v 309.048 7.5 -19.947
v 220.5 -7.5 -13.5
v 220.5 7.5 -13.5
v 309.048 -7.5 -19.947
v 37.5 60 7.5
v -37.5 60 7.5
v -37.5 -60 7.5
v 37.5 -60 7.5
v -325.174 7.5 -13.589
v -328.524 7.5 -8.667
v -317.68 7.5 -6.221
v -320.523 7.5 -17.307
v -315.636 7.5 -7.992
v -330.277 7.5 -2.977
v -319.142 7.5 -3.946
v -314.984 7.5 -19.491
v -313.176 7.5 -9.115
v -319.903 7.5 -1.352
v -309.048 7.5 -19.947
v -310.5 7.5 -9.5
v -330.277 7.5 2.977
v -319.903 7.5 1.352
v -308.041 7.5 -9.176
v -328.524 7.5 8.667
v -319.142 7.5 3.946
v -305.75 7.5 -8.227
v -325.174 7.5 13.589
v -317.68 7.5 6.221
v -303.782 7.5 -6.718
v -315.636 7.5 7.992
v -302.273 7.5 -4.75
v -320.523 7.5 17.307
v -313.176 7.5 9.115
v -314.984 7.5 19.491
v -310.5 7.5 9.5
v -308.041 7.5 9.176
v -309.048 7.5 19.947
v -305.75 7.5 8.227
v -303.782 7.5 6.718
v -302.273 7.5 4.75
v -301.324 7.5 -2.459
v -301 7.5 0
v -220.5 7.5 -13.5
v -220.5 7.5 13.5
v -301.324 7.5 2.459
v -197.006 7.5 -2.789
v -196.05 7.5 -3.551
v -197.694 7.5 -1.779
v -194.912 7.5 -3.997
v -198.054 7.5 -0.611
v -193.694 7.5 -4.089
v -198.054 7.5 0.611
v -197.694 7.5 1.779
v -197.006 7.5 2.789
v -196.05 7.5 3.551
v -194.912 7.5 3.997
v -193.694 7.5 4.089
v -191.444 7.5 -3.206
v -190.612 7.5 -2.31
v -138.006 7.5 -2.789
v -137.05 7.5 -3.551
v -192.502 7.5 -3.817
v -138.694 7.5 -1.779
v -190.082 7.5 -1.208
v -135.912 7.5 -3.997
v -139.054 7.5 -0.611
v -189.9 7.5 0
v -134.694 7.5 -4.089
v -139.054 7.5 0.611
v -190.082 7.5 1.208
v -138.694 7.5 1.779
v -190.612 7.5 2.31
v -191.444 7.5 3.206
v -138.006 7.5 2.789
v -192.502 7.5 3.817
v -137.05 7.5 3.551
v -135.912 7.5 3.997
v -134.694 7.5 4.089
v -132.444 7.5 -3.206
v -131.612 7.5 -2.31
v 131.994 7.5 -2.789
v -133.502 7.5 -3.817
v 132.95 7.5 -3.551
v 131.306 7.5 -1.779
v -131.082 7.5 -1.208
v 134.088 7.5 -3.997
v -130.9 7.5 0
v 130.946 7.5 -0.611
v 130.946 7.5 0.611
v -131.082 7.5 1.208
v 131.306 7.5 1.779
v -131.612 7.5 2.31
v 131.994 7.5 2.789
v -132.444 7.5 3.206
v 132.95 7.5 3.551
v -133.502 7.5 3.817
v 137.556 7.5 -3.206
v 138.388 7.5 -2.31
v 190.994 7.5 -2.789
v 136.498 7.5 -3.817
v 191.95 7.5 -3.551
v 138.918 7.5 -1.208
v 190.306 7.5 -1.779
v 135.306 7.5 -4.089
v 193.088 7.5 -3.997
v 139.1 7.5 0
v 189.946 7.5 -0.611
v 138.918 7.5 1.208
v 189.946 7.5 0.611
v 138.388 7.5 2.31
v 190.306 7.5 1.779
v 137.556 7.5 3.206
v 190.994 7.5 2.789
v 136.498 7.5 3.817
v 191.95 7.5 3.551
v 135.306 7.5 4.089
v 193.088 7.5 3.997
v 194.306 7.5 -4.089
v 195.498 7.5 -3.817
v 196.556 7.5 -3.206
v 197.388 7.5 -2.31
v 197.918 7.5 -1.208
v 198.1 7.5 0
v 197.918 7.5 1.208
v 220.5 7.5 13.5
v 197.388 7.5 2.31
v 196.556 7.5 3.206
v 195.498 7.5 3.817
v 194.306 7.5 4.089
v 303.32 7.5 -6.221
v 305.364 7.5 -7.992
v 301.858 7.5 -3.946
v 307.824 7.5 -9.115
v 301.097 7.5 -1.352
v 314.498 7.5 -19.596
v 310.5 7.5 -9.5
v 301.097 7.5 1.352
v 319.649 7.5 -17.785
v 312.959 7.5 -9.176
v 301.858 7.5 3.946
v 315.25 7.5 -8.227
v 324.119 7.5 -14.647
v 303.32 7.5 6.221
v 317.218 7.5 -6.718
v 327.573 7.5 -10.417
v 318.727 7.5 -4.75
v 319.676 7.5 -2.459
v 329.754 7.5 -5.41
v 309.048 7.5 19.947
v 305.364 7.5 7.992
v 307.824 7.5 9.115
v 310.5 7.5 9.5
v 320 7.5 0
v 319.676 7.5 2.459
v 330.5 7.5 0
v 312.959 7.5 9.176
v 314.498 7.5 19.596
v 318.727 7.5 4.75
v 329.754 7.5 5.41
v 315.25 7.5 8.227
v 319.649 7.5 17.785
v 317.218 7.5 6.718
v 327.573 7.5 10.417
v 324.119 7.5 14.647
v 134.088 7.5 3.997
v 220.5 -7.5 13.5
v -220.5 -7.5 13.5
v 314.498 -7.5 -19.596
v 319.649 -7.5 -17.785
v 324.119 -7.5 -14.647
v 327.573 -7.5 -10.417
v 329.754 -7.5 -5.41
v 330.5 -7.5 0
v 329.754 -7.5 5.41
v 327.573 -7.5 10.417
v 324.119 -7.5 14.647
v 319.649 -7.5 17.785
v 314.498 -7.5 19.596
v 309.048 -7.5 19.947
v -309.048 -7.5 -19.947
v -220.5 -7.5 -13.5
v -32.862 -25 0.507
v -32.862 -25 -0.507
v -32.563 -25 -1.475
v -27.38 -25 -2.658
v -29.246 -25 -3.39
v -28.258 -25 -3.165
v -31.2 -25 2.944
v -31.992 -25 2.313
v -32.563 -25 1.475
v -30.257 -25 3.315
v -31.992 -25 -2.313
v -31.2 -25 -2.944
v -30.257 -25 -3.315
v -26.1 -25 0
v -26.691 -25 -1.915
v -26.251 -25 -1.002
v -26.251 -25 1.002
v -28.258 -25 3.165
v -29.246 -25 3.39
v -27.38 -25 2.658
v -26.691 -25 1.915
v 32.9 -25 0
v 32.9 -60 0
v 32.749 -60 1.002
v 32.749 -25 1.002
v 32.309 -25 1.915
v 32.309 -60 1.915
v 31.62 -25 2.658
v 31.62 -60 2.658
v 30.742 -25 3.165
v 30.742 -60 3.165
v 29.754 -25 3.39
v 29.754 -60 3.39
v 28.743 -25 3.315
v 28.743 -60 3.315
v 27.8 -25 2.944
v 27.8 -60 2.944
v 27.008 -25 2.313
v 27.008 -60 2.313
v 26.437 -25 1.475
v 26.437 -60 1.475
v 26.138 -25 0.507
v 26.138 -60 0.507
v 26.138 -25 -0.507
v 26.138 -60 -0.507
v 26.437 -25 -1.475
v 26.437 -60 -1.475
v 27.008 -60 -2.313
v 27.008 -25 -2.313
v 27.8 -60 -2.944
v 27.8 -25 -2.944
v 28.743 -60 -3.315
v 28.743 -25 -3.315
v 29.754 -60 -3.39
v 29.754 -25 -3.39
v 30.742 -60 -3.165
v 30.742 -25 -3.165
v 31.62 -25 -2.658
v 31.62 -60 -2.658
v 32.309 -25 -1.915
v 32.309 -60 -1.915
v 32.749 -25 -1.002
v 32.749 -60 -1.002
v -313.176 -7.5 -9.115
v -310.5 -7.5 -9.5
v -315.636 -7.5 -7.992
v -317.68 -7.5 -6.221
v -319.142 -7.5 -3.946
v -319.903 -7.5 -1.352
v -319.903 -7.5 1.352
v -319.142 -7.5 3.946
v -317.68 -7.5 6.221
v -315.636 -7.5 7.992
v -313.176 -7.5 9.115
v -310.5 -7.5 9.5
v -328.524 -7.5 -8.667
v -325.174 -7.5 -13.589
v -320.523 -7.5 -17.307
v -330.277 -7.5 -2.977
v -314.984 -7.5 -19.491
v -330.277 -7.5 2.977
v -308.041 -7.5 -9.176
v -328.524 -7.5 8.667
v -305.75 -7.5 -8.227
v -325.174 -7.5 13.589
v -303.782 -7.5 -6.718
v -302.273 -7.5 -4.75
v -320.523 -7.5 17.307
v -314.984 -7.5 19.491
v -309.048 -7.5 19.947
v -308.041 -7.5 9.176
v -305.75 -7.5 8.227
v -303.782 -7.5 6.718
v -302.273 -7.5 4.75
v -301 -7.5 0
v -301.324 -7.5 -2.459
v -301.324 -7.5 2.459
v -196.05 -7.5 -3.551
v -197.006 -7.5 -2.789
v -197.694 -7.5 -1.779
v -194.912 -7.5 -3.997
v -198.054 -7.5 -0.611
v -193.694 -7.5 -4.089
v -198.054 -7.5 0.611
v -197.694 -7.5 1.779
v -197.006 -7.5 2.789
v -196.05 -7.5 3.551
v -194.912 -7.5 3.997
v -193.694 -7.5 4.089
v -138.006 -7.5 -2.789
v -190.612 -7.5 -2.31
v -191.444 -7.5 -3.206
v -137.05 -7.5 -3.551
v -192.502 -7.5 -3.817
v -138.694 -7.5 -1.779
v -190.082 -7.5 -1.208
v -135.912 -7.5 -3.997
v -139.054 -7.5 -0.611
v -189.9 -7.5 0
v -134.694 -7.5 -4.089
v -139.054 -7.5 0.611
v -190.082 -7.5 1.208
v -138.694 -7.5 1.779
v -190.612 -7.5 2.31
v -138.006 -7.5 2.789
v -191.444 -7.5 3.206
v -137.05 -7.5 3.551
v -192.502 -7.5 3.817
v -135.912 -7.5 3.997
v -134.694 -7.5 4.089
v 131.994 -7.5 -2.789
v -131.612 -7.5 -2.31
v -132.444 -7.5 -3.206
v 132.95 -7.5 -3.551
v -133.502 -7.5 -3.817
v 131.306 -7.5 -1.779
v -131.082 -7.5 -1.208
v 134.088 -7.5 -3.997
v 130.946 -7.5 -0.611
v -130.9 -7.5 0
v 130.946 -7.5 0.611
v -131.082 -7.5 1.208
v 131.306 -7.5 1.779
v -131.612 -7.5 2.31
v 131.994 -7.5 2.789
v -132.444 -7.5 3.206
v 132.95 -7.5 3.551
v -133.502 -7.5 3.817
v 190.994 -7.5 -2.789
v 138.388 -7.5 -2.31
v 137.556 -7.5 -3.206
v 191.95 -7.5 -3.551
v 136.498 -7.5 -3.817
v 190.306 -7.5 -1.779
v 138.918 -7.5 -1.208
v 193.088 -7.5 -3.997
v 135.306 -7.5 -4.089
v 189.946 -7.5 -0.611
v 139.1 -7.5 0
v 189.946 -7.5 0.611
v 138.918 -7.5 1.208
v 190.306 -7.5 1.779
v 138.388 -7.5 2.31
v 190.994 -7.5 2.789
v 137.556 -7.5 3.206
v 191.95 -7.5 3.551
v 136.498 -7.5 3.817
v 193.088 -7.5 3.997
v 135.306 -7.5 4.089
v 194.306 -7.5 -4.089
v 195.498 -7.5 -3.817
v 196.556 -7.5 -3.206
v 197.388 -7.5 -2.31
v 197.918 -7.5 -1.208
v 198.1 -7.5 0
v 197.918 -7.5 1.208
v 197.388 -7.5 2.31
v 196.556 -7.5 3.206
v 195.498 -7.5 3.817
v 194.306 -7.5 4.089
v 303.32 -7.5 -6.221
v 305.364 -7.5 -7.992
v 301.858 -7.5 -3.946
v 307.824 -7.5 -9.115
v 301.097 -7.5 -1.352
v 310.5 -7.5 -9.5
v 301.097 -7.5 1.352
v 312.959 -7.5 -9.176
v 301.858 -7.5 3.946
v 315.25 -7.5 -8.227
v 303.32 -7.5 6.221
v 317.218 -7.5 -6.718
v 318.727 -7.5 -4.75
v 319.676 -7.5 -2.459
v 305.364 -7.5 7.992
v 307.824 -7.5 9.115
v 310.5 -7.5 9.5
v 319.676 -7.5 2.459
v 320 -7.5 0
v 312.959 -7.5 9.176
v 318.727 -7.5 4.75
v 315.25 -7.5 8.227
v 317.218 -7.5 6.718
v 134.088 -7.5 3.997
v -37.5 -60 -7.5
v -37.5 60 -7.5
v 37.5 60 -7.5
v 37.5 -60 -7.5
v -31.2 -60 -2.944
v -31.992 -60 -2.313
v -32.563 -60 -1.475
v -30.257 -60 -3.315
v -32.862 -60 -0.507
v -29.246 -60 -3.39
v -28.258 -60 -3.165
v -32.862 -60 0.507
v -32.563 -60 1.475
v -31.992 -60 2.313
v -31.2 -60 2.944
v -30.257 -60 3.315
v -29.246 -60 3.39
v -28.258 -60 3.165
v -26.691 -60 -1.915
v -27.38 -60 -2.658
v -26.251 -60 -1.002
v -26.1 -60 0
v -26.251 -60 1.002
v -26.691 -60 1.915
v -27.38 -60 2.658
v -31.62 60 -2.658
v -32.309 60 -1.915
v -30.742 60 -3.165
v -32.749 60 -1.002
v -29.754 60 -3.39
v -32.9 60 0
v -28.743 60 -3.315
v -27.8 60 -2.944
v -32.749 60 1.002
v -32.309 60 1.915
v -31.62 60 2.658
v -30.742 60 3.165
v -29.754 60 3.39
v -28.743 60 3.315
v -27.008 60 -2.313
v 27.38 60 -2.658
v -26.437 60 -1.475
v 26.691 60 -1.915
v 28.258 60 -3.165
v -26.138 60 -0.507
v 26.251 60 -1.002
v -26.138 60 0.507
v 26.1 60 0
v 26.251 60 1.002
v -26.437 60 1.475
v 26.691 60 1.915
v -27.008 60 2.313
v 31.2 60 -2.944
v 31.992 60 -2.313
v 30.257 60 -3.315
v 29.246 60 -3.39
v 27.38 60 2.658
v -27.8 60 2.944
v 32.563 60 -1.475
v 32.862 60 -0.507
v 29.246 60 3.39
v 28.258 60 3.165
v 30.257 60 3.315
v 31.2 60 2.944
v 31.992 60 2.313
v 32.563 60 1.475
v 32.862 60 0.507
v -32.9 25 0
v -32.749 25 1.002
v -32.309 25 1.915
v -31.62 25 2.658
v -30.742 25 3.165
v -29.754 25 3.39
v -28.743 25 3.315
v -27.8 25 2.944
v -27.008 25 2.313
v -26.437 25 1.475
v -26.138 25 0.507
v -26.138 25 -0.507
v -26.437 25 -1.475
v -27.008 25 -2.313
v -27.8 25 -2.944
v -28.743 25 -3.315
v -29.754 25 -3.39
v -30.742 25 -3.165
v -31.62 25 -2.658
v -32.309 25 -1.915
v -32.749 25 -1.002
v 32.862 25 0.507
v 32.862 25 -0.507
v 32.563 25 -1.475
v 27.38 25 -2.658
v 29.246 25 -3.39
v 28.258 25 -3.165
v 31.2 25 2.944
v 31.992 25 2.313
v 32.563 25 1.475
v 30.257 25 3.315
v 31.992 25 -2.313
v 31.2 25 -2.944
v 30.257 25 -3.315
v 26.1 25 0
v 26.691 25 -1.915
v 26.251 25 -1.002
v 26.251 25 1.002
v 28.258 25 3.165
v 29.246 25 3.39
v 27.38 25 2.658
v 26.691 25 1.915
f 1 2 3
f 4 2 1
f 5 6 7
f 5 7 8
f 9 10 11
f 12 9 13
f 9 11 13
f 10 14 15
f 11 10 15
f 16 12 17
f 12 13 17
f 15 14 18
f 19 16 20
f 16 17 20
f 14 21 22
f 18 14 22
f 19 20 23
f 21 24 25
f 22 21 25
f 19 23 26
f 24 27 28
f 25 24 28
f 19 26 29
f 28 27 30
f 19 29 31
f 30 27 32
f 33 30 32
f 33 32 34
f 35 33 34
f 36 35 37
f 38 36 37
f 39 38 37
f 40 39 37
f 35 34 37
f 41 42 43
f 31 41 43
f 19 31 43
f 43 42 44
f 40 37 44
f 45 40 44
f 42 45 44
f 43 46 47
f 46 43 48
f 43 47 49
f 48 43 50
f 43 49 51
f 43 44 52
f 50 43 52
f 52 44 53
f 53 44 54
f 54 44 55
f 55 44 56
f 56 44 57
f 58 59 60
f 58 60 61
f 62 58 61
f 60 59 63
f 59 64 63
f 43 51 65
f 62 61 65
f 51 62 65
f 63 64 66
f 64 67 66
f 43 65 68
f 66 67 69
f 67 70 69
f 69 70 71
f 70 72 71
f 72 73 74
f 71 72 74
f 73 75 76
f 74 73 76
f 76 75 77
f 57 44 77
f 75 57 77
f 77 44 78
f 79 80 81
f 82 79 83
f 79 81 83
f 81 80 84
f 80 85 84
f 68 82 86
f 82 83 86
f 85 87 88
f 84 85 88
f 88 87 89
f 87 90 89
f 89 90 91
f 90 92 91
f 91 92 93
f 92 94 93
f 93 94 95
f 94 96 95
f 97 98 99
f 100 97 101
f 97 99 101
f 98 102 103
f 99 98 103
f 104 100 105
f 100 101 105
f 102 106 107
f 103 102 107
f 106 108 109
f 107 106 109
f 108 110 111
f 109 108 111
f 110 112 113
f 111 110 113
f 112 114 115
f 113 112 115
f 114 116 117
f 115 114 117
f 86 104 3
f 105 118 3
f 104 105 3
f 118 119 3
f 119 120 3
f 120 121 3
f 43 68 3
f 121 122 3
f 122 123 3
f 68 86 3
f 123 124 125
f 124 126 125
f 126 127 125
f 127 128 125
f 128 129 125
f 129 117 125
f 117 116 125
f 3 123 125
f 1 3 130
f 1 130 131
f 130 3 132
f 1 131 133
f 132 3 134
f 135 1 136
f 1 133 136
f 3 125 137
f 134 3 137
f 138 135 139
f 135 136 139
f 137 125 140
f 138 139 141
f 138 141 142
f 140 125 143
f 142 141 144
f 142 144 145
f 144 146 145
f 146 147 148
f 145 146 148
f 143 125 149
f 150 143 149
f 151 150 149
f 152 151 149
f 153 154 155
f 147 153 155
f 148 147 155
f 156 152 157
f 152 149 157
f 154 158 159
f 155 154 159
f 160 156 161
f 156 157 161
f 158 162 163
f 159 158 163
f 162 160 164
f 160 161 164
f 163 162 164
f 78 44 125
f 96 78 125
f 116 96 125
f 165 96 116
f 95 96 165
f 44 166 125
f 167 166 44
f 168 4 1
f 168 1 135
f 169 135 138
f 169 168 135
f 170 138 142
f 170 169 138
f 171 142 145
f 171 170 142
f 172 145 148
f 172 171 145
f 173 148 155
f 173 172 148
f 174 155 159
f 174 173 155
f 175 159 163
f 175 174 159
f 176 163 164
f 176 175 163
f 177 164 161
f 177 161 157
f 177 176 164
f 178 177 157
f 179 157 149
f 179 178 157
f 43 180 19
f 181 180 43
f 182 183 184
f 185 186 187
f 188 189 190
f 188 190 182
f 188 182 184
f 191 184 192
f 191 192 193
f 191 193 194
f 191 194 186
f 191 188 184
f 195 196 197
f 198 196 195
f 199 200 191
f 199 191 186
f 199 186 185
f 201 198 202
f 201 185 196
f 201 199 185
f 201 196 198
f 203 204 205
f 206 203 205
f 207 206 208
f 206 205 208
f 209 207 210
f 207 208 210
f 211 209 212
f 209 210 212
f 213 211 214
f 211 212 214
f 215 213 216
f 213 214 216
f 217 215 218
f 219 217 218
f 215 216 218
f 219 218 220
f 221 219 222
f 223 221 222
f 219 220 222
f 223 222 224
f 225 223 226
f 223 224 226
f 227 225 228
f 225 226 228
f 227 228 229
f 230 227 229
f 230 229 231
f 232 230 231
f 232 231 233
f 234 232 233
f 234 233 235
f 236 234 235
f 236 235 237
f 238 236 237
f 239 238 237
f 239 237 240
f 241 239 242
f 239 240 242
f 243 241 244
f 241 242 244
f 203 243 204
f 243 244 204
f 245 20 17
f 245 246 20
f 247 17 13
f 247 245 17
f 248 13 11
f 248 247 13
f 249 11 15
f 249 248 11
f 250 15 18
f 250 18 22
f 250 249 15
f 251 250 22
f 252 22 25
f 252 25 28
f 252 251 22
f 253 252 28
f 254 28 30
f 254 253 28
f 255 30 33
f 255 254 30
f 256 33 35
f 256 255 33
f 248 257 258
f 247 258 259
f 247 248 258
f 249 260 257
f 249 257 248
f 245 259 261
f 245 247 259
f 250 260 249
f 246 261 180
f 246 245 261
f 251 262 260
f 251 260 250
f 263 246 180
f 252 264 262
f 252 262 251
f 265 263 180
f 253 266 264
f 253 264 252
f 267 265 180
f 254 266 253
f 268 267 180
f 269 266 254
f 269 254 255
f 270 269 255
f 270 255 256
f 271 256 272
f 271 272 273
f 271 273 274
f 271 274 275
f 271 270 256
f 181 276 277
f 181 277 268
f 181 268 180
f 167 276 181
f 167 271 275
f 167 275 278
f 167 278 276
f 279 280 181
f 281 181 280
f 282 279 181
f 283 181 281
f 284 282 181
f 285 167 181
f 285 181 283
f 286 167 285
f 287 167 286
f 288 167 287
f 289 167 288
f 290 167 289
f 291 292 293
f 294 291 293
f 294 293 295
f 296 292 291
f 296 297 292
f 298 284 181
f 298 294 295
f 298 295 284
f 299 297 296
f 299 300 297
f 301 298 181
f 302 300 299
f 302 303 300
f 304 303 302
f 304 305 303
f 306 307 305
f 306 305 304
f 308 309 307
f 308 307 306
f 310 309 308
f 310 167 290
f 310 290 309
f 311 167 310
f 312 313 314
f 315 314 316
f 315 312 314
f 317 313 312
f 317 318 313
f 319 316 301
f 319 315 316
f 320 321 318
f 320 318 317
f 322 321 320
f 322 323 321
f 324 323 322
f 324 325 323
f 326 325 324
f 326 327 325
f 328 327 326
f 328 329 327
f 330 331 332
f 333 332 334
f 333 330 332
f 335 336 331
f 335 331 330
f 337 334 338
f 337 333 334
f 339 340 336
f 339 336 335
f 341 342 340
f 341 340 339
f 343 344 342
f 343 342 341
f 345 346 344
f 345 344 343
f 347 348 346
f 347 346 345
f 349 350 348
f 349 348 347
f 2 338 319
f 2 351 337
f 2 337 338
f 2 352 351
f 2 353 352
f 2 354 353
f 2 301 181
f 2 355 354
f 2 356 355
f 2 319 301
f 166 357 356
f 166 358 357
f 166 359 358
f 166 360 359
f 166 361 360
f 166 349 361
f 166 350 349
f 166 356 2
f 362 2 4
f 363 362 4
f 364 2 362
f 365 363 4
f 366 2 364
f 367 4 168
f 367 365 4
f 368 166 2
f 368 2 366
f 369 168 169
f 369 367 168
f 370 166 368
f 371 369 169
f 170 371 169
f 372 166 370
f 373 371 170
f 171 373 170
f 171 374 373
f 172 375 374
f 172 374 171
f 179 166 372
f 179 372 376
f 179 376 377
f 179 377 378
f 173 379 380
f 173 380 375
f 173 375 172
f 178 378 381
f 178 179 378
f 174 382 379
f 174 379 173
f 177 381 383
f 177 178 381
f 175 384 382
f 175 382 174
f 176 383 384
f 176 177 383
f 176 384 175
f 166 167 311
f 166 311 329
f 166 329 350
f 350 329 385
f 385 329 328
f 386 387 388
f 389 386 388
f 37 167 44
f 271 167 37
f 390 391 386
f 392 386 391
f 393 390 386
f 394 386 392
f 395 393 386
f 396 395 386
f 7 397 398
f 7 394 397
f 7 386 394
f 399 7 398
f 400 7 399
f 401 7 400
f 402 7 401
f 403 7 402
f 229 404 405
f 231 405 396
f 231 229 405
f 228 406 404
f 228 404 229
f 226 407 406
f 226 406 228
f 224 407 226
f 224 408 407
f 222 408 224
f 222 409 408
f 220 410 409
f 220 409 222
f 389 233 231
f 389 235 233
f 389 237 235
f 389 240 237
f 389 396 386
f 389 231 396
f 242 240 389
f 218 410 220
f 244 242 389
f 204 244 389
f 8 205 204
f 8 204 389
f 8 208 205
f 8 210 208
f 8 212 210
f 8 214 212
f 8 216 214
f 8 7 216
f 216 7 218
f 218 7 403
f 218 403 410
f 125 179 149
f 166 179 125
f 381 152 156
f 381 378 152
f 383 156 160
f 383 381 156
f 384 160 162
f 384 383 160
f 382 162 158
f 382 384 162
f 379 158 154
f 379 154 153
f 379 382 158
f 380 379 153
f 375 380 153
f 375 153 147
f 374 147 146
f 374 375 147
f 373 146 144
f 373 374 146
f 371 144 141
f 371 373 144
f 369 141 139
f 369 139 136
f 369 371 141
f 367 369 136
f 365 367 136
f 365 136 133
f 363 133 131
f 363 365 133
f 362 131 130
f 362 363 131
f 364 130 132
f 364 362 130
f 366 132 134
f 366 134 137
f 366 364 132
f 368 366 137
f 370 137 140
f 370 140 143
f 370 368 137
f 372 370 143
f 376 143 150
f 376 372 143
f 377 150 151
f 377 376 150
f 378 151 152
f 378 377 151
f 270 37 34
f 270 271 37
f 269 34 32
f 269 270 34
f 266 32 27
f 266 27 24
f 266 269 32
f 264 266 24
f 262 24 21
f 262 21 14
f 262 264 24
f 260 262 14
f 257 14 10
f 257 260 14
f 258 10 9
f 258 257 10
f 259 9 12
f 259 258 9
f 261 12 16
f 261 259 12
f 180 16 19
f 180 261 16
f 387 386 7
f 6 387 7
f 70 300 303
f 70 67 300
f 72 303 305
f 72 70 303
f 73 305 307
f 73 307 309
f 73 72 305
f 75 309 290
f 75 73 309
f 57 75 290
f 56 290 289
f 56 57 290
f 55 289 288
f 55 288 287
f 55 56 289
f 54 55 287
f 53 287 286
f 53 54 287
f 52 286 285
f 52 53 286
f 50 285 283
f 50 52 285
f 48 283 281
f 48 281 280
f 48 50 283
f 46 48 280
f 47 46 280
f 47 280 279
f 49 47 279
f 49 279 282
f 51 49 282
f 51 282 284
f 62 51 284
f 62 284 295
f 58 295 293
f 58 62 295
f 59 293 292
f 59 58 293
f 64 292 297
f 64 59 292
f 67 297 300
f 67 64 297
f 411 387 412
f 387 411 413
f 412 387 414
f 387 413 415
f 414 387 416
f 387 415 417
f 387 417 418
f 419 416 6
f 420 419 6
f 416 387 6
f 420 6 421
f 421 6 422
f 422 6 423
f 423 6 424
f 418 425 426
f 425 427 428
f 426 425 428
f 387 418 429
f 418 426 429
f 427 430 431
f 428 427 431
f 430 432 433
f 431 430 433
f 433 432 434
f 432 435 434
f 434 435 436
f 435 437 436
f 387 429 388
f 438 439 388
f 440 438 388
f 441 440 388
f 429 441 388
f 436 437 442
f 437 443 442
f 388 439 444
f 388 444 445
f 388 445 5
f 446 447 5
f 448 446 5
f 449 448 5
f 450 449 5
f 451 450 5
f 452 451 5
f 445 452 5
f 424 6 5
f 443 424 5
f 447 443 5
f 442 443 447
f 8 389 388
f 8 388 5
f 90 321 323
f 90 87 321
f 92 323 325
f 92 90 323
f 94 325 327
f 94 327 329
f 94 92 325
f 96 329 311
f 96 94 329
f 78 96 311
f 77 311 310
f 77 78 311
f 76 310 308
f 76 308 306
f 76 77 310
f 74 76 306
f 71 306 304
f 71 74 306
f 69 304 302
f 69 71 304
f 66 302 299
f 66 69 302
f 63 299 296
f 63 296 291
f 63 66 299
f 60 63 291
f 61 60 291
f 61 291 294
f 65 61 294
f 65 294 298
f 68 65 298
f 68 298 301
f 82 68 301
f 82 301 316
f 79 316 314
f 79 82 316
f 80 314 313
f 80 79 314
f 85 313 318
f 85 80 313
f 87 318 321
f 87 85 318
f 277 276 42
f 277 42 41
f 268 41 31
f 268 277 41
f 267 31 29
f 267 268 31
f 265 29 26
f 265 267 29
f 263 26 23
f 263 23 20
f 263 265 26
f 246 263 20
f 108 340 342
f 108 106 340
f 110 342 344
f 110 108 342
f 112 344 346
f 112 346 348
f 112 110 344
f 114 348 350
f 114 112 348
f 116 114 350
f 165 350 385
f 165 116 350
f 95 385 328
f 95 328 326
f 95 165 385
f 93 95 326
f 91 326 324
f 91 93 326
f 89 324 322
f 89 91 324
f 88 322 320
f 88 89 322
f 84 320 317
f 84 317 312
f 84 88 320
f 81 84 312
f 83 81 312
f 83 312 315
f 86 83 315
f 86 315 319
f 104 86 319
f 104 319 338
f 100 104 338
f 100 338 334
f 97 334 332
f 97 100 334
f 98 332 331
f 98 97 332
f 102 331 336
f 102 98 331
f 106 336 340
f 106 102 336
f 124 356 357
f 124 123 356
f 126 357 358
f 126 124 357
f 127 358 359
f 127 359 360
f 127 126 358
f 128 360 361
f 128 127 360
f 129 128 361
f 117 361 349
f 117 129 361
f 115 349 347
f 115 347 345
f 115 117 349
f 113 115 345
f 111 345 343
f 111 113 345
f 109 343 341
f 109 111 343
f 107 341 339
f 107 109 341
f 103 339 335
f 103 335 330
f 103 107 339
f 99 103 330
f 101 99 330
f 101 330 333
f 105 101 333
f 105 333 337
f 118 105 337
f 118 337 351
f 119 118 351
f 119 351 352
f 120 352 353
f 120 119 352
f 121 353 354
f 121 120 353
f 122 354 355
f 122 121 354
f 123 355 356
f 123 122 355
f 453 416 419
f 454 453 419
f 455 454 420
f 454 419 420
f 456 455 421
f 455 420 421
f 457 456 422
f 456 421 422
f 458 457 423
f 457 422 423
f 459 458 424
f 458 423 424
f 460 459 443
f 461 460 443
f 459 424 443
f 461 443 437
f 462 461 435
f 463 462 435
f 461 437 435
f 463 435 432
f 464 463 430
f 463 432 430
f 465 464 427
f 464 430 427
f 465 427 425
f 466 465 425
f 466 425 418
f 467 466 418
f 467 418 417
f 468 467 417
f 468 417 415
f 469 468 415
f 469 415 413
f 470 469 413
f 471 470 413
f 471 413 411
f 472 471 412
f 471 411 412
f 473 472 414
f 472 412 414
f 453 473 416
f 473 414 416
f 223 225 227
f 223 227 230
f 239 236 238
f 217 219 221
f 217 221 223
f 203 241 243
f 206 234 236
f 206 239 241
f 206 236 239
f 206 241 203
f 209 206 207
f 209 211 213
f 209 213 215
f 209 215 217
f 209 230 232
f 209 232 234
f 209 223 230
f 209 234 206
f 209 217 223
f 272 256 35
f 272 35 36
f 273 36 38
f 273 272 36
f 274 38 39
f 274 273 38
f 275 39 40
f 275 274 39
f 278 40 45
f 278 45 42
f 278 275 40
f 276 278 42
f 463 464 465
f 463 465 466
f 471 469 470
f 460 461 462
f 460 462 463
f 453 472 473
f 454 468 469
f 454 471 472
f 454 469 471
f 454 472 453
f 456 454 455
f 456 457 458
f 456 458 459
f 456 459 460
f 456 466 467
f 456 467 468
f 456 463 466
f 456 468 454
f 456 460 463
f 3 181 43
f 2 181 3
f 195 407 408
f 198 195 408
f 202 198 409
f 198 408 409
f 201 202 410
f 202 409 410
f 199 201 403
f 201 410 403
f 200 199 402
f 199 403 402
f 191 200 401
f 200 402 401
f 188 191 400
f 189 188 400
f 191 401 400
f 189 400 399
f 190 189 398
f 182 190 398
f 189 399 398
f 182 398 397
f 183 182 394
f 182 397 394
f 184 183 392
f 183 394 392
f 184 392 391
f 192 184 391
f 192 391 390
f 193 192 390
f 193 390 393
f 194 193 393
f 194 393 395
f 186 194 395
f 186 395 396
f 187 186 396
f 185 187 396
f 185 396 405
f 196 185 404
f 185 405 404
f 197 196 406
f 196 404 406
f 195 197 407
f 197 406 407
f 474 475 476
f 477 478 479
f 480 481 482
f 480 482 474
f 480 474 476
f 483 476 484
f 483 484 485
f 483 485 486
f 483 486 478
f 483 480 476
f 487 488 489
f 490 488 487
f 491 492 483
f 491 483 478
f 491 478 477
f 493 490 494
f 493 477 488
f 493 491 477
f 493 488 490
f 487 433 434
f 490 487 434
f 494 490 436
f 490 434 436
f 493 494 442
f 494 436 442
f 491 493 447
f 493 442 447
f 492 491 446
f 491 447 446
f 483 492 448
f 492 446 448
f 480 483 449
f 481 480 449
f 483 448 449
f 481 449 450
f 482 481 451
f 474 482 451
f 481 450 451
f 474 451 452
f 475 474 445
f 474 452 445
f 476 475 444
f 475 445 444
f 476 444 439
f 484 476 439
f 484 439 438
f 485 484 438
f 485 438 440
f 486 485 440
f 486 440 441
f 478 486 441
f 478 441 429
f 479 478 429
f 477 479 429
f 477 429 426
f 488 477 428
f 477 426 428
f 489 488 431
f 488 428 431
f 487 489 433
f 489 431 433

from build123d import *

# Parameters (mm, degrees)
F0_R     = 4.1
F1_DEPTH = 7.5
F2_W     = 75
F2_H     = 15
F2_R     = 3.4
F3_DEPTH = 60
F4_R     = 3.4
F6_DEPTH = 35
F5_R     = 3.4
F7_DEPTH = 35


with BuildPart() as f1:
    # F0 (on Front) → F1 (new body, symmetric)
    with BuildSketch(Plane.XZ):
        with BuildLine():
            Line((-310.5, 13.5), (-295.743645, 13.5))
            ThreePointArc((-295.743645, 13.5), (-301.77806, 17.997993), (-309.047635, 19.947196))
            ThreePointArc((-309.047635, 19.947196), (-330.5, 0), (-309.047635, -19.947196))
            ThreePointArc((-309.047635, -19.947196), (-301.77806, -17.997993), (-295.743645, -13.5))
            Line((-295.743645, -13.5), (-310.5, -13.5))
            Line((-310.5, -13.5), (-310.5, -9.5))
            ThreePointArc((-310.5, -9.5), (-320, 0), (-310.5, 9.5))
            Line((-310.5, 9.5), (-310.5, 13.5))
        make_face()
        with BuildLine():
            ThreePointArc((-290.5, 0), (-291.856944, 7.241302), (-295.743645, 13.5))
            Line((-295.743645, 13.5), (-310.5, 13.5))
            Line((-310.5, 13.5), (-310.5, 9.5))
            ThreePointArc((-310.5, 9.5), (-303.782486, 6.717514), (-301, 0))
            ThreePointArc((-301, 0), (-303.782486, -6.717514), (-310.5, -9.5))
            Line((-310.5, -9.5), (-310.5, -13.5))
            Line((-310.5, -13.5), (-295.743645, -13.5))
            ThreePointArc((-295.743645, -13.5), (-291.856944, -7.241302), (-290.5, 0))
        make_face()
        with BuildLine():
            Line((-295.743645, 13.5), (-220.5, 13.5))
            Line((-220.5, 13.5), (-309.047635, 19.947196))
            ThreePointArc((-309.047635, 19.947196), (-301.77806, 17.997993), (-295.743645, 13.5))
        make_face()
        with BuildLine():
            ThreePointArc((-295.743645, -13.5), (-301.77806, -17.997993), (-309.047635, -19.947196))
            Line((-309.047635, -19.947196), (-220.5, -13.5))
            Line((-220.5, -13.5), (-295.743645, -13.5))
        make_face()
        with BuildLine():
            Line((295.743645, 13.5), (220.5, 13.5))
            Line((220.5, 13.5), (-220.5, 13.5))
            Line((-220.5, 13.5), (-295.743645, 13.5))
            ThreePointArc((-295.743645, 13.5), (-291.856944, 7.241302), (-290.5, 0))
            ThreePointArc((-290.5, 0), (-291.856944, -7.241302), (-295.743645, -13.5))
            Line((-295.743645, -13.5), (-220.5, -13.5))
            Line((-220.5, -13.5), (220.5, -13.5))
            Line((220.5, -13.5), (295.743645, -13.5))
            ThreePointArc((295.743645, -13.5), (290.5, 0), (295.743645, 13.5))
        make_face()
        with Locations((-194, 0)):
            Circle(F0_R, mode=Mode.SUBTRACT)
        with Locations((-135, 0)):
            Circle(F0_R, mode=Mode.SUBTRACT)
        with Locations((135, 0)):
            Circle(F0_R, mode=Mode.SUBTRACT)
        with Locations((194, 0)):
            Circle(F0_R, mode=Mode.SUBTRACT)
        with BuildLine():
            Line((309.047635, 19.947196), (220.5, 13.5))
            Line((220.5, 13.5), (295.743645, 13.5))
            ThreePointArc((295.743645, 13.5), (301.77806, 17.997993), (309.047635, 19.947196))
        make_face()
        with BuildLine():
            ThreePointArc((309.047635, -19.947196), (301.77806, -17.997993), (295.743645, -13.5))
            Line((295.743645, -13.5), (220.5, -13.5))
            Line((220.5, -13.5), (309.047635, -19.947196))
        make_face()
        with BuildLine():
            ThreePointArc((309.047635, 19.947196), (301.77806, 17.997993), (295.743645, 13.5))
            Line((295.743645, 13.5), (310.5, 13.5))
            Line((310.5, 13.5), (310.5, 9.5))
            ThreePointArc((310.5, 9.5), (317.217514, 6.717514), (320, 0))
            ThreePointArc((320, 0), (317.217514, -6.717514), (310.5, -9.5))
            Line((310.5, -9.5), (310.5, -13.5))
            Line((310.5, -13.5), (295.743645, -13.5))
            ThreePointArc((295.743645, -13.5), (301.77806, -17.997993), (309.047635, -19.947196))
            ThreePointArc((309.047635, -19.947196), (324.11897, -14.646626), (330.5, 0))
            ThreePointArc((330.5, 0), (324.11897, 14.646626), (309.047635, 19.947196))
        make_face()
        with BuildLine():
            Line((310.5, 13.5), (295.743645, 13.5))
            ThreePointArc((295.743645, 13.5), (290.5, 0), (295.743645, -13.5))
            Line((295.743645, -13.5), (310.5, -13.5))
            Line((310.5, -13.5), (310.5, -9.5))
            ThreePointArc((310.5, -9.5), (301, 0), (310.5, 9.5))
            Line((310.5, 9.5), (310.5, 13.5))
        make_face()
    extrude(amount=F1_DEPTH, both=True)


with BuildPart() as f3:
    # F2 (on Front) → F3 (new body, symmetric)
    with BuildSketch(Plane.XZ):
        Rectangle(F2_W, F2_H)
        with Locations((-29.5, 0)):
            Circle(F2_R, mode=Mode.SUBTRACT)
        with Locations((29.5, 0)):
            Circle(F2_R, mode=Mode.SUBTRACT)
        with Locations((-29.5, 0)):
            Circle(F2_R)
        with Locations((29.5, 0)):
            Circle(F2_R)
    extrude(amount=F3_DEPTH, both=True)

    # F4 (on face) → F6 (cut)
    with BuildSketch(Plane.XZ.offset(60)):
        with Locations((-29.5, 0)):
            Circle(F4_R)
        with Locations((29.5, 0)):
            Circle(F4_R)
    extrude(amount=-F6_DEPTH, mode=Mode.SUBTRACT)

    # F5 (on face) → F7 (cut)
    with BuildSketch(Plane(origin=(0, 60, 0), x_dir=(-1, 0, 0), z_dir=(0, 1, 0))):
        with Locations((-29.5, 0)):
            Circle(F5_R)
        with Locations((29.5, 0)):
            Circle(F5_R)
    extrude(amount=-F7_DEPTH, mode=Mode.SUBTRACT)


solid = Compound([f1.part, f3.part])
